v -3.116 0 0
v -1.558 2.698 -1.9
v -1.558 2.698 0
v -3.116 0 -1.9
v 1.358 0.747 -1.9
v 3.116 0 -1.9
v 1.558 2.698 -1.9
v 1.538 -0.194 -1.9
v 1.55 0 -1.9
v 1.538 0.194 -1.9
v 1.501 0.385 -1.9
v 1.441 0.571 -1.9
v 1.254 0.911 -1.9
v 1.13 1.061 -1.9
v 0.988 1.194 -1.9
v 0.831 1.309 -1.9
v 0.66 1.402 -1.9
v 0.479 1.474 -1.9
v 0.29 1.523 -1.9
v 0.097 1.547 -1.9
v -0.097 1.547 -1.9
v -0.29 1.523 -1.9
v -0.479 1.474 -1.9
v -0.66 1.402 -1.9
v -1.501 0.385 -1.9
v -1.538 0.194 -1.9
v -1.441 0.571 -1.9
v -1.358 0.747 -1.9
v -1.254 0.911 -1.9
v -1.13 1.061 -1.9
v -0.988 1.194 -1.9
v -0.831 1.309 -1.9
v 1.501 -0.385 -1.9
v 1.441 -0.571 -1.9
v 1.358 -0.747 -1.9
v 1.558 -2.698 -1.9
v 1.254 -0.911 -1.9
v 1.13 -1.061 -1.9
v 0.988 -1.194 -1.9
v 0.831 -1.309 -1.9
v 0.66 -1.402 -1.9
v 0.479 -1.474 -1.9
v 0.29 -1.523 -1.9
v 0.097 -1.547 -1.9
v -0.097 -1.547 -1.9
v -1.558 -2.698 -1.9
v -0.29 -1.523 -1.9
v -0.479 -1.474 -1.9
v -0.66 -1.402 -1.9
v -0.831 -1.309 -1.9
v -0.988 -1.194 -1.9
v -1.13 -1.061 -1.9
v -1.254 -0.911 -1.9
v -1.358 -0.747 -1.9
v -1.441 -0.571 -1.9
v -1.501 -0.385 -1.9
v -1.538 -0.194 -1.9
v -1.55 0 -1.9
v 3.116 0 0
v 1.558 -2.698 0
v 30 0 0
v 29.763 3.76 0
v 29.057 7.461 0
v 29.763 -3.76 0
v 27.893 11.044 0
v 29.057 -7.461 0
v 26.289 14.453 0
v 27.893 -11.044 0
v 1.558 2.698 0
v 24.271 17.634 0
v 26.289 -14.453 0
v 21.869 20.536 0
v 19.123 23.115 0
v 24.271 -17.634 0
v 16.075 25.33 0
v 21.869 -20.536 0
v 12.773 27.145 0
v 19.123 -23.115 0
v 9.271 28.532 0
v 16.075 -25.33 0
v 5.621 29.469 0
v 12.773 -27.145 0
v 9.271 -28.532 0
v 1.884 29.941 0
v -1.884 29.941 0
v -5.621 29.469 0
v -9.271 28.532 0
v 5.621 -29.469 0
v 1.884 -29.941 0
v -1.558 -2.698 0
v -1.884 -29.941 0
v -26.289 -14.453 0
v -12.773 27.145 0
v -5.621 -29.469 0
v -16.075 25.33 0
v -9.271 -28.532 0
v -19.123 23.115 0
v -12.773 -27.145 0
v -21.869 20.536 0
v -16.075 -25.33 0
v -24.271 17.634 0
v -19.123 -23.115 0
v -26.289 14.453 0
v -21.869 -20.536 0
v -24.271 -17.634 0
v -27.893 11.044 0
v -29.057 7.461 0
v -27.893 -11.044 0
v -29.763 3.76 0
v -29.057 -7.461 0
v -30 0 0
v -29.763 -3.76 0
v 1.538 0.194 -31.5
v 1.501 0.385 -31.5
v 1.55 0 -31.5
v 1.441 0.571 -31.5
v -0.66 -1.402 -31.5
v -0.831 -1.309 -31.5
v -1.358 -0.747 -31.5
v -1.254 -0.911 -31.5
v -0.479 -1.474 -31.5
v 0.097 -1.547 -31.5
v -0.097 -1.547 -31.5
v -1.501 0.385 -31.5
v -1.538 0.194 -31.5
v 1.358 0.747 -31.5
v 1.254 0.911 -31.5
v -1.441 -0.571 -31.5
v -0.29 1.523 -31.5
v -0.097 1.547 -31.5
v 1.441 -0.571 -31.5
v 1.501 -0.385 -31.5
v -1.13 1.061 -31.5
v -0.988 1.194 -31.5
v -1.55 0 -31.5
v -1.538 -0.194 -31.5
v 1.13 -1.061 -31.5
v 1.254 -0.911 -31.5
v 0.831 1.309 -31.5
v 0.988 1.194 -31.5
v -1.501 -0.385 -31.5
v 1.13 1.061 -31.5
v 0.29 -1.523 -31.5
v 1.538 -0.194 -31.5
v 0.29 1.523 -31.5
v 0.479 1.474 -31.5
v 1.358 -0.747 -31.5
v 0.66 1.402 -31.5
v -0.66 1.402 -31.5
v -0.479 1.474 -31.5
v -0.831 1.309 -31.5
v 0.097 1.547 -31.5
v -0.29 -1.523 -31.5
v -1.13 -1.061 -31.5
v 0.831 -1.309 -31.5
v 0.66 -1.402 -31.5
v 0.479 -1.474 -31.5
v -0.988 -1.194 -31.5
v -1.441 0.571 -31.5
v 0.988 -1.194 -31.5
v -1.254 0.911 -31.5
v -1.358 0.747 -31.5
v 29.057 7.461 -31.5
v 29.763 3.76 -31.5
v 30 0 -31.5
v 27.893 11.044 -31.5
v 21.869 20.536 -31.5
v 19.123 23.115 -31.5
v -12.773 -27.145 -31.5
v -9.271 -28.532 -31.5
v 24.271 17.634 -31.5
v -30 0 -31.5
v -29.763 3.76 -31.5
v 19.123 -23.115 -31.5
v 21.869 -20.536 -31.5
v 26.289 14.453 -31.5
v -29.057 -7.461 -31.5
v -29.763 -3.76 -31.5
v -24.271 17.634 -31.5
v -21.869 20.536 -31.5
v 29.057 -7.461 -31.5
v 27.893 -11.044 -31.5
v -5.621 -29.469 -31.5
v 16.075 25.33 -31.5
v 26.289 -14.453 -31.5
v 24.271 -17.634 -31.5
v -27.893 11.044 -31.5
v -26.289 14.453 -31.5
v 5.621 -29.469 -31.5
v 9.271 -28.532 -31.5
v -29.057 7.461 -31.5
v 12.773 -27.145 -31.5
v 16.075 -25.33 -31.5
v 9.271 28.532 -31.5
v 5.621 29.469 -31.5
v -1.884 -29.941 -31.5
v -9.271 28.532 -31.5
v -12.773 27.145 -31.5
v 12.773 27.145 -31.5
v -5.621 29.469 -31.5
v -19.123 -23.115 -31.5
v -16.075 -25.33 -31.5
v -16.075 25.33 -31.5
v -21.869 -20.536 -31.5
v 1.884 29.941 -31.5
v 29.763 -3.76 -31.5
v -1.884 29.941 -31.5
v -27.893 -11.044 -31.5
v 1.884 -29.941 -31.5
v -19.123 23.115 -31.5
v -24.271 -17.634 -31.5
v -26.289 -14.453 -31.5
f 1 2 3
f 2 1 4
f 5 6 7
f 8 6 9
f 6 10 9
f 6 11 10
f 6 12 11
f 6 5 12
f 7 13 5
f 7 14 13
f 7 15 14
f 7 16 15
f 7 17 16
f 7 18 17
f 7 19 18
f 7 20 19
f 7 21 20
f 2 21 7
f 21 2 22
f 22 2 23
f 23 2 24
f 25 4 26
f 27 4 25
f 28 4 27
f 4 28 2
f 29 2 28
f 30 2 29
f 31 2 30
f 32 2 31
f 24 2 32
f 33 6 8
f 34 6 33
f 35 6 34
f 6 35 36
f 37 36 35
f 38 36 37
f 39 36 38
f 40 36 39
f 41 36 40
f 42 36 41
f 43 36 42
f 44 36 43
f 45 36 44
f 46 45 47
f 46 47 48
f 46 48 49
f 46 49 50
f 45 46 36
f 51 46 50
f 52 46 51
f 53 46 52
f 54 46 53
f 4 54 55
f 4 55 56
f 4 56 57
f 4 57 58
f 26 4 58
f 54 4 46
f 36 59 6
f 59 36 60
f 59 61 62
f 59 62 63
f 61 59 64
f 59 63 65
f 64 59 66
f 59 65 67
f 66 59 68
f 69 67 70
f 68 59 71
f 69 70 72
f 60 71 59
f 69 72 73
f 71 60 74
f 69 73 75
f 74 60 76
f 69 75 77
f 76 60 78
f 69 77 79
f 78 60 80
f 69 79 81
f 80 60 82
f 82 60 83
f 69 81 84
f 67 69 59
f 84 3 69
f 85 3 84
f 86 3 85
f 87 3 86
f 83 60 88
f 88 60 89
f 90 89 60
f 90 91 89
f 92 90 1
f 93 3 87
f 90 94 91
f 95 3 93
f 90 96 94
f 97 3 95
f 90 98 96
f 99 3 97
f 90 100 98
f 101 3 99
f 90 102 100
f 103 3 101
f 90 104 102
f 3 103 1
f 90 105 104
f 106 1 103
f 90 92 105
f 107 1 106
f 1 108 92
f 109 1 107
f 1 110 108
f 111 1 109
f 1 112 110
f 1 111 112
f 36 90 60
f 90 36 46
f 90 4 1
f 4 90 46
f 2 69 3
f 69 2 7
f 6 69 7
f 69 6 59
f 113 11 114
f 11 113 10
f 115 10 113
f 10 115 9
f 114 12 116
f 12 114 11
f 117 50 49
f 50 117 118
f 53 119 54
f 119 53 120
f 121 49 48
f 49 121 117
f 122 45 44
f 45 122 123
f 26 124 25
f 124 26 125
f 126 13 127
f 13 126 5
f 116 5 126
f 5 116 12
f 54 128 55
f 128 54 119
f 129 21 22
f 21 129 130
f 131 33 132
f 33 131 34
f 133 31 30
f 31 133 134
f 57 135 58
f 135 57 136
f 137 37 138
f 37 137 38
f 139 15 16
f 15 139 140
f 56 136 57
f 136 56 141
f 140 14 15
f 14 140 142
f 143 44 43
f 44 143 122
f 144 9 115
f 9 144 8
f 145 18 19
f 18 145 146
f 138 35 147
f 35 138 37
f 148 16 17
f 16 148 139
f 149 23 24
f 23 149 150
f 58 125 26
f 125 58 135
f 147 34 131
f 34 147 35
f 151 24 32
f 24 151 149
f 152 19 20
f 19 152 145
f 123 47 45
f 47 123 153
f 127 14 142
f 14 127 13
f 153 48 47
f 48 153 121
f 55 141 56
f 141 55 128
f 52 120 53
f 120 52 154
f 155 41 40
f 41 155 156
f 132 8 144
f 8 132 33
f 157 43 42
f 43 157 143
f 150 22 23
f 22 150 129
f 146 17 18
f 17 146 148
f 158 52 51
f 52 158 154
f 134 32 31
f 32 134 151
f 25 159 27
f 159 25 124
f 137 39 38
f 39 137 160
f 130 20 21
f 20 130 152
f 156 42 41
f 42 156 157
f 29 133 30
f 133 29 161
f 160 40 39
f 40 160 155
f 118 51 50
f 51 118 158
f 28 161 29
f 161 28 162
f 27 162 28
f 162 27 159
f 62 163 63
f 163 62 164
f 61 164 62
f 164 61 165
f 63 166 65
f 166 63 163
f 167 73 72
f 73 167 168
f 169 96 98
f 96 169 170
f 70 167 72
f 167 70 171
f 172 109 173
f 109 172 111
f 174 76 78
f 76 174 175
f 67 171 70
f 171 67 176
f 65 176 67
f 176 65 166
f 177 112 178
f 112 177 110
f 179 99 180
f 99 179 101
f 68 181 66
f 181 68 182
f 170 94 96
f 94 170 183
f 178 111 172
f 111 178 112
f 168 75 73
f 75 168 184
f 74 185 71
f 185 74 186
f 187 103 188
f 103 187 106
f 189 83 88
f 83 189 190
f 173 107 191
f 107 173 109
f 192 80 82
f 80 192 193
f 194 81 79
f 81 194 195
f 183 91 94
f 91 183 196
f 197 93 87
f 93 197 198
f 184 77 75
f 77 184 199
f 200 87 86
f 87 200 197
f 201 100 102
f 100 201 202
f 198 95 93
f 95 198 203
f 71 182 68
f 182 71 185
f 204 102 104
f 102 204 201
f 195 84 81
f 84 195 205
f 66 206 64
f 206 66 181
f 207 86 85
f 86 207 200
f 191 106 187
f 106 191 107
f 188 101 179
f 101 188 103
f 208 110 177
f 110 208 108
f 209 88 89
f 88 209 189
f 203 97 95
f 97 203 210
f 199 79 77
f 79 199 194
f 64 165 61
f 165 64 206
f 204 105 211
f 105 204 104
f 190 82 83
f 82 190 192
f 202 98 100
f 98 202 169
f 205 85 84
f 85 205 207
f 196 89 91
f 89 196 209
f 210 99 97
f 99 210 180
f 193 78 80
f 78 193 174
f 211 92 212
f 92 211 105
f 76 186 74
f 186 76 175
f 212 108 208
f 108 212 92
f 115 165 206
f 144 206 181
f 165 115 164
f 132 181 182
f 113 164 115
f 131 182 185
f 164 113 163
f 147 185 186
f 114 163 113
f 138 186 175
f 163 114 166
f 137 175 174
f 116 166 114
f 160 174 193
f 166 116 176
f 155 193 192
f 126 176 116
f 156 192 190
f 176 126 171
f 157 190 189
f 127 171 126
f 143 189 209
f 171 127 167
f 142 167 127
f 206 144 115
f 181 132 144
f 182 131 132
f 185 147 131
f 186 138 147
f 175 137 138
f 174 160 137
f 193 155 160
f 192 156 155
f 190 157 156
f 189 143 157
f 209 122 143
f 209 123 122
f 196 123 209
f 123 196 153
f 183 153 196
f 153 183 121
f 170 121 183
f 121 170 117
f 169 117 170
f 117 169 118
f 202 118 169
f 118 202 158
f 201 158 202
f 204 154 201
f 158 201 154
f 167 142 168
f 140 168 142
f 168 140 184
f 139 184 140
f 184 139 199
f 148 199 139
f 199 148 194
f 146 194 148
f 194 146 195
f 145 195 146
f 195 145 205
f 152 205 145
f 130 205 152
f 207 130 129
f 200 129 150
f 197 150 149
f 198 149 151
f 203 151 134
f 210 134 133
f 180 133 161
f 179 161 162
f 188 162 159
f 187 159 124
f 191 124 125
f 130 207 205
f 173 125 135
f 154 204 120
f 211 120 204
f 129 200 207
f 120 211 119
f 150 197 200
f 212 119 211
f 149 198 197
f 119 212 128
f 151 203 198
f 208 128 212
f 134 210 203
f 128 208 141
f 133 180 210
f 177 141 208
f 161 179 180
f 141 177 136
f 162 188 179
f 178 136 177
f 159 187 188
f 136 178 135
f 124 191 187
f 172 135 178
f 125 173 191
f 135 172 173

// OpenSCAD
$fn = 50;


difference() {
	union() {
		translate(v = [0, 0, -31.5000000000]) {
			cylinder(h = 31.5000000000, r = 30.0000000000);
		}
	}
	union() {
		translate(v = [0, 0, 0]) {
			rotate(a = [0, 0, 0]) {
				difference() {
					union() {
						translate(v = [0, 0, -1.9000000000]) {
							linear_extrude(height = 1.9000000000) {
								polygon(points = [[3.1158000000, 0.0000000000], [1.5579000000, 2.6983619531], [-1.5579000000, 2.6983619531], [-3.1158000000, 0.0000000000], [-1.5579000000, -2.6983619531], [1.5579000000, -2.6983619531]]);
							}
						}
					}
					union();
				}
			}
		}
		#translate(v = [0, 0, -100.0000000000]) {
			cylinder(h = 200, r = 1.5500000000);
		}
	}
}
